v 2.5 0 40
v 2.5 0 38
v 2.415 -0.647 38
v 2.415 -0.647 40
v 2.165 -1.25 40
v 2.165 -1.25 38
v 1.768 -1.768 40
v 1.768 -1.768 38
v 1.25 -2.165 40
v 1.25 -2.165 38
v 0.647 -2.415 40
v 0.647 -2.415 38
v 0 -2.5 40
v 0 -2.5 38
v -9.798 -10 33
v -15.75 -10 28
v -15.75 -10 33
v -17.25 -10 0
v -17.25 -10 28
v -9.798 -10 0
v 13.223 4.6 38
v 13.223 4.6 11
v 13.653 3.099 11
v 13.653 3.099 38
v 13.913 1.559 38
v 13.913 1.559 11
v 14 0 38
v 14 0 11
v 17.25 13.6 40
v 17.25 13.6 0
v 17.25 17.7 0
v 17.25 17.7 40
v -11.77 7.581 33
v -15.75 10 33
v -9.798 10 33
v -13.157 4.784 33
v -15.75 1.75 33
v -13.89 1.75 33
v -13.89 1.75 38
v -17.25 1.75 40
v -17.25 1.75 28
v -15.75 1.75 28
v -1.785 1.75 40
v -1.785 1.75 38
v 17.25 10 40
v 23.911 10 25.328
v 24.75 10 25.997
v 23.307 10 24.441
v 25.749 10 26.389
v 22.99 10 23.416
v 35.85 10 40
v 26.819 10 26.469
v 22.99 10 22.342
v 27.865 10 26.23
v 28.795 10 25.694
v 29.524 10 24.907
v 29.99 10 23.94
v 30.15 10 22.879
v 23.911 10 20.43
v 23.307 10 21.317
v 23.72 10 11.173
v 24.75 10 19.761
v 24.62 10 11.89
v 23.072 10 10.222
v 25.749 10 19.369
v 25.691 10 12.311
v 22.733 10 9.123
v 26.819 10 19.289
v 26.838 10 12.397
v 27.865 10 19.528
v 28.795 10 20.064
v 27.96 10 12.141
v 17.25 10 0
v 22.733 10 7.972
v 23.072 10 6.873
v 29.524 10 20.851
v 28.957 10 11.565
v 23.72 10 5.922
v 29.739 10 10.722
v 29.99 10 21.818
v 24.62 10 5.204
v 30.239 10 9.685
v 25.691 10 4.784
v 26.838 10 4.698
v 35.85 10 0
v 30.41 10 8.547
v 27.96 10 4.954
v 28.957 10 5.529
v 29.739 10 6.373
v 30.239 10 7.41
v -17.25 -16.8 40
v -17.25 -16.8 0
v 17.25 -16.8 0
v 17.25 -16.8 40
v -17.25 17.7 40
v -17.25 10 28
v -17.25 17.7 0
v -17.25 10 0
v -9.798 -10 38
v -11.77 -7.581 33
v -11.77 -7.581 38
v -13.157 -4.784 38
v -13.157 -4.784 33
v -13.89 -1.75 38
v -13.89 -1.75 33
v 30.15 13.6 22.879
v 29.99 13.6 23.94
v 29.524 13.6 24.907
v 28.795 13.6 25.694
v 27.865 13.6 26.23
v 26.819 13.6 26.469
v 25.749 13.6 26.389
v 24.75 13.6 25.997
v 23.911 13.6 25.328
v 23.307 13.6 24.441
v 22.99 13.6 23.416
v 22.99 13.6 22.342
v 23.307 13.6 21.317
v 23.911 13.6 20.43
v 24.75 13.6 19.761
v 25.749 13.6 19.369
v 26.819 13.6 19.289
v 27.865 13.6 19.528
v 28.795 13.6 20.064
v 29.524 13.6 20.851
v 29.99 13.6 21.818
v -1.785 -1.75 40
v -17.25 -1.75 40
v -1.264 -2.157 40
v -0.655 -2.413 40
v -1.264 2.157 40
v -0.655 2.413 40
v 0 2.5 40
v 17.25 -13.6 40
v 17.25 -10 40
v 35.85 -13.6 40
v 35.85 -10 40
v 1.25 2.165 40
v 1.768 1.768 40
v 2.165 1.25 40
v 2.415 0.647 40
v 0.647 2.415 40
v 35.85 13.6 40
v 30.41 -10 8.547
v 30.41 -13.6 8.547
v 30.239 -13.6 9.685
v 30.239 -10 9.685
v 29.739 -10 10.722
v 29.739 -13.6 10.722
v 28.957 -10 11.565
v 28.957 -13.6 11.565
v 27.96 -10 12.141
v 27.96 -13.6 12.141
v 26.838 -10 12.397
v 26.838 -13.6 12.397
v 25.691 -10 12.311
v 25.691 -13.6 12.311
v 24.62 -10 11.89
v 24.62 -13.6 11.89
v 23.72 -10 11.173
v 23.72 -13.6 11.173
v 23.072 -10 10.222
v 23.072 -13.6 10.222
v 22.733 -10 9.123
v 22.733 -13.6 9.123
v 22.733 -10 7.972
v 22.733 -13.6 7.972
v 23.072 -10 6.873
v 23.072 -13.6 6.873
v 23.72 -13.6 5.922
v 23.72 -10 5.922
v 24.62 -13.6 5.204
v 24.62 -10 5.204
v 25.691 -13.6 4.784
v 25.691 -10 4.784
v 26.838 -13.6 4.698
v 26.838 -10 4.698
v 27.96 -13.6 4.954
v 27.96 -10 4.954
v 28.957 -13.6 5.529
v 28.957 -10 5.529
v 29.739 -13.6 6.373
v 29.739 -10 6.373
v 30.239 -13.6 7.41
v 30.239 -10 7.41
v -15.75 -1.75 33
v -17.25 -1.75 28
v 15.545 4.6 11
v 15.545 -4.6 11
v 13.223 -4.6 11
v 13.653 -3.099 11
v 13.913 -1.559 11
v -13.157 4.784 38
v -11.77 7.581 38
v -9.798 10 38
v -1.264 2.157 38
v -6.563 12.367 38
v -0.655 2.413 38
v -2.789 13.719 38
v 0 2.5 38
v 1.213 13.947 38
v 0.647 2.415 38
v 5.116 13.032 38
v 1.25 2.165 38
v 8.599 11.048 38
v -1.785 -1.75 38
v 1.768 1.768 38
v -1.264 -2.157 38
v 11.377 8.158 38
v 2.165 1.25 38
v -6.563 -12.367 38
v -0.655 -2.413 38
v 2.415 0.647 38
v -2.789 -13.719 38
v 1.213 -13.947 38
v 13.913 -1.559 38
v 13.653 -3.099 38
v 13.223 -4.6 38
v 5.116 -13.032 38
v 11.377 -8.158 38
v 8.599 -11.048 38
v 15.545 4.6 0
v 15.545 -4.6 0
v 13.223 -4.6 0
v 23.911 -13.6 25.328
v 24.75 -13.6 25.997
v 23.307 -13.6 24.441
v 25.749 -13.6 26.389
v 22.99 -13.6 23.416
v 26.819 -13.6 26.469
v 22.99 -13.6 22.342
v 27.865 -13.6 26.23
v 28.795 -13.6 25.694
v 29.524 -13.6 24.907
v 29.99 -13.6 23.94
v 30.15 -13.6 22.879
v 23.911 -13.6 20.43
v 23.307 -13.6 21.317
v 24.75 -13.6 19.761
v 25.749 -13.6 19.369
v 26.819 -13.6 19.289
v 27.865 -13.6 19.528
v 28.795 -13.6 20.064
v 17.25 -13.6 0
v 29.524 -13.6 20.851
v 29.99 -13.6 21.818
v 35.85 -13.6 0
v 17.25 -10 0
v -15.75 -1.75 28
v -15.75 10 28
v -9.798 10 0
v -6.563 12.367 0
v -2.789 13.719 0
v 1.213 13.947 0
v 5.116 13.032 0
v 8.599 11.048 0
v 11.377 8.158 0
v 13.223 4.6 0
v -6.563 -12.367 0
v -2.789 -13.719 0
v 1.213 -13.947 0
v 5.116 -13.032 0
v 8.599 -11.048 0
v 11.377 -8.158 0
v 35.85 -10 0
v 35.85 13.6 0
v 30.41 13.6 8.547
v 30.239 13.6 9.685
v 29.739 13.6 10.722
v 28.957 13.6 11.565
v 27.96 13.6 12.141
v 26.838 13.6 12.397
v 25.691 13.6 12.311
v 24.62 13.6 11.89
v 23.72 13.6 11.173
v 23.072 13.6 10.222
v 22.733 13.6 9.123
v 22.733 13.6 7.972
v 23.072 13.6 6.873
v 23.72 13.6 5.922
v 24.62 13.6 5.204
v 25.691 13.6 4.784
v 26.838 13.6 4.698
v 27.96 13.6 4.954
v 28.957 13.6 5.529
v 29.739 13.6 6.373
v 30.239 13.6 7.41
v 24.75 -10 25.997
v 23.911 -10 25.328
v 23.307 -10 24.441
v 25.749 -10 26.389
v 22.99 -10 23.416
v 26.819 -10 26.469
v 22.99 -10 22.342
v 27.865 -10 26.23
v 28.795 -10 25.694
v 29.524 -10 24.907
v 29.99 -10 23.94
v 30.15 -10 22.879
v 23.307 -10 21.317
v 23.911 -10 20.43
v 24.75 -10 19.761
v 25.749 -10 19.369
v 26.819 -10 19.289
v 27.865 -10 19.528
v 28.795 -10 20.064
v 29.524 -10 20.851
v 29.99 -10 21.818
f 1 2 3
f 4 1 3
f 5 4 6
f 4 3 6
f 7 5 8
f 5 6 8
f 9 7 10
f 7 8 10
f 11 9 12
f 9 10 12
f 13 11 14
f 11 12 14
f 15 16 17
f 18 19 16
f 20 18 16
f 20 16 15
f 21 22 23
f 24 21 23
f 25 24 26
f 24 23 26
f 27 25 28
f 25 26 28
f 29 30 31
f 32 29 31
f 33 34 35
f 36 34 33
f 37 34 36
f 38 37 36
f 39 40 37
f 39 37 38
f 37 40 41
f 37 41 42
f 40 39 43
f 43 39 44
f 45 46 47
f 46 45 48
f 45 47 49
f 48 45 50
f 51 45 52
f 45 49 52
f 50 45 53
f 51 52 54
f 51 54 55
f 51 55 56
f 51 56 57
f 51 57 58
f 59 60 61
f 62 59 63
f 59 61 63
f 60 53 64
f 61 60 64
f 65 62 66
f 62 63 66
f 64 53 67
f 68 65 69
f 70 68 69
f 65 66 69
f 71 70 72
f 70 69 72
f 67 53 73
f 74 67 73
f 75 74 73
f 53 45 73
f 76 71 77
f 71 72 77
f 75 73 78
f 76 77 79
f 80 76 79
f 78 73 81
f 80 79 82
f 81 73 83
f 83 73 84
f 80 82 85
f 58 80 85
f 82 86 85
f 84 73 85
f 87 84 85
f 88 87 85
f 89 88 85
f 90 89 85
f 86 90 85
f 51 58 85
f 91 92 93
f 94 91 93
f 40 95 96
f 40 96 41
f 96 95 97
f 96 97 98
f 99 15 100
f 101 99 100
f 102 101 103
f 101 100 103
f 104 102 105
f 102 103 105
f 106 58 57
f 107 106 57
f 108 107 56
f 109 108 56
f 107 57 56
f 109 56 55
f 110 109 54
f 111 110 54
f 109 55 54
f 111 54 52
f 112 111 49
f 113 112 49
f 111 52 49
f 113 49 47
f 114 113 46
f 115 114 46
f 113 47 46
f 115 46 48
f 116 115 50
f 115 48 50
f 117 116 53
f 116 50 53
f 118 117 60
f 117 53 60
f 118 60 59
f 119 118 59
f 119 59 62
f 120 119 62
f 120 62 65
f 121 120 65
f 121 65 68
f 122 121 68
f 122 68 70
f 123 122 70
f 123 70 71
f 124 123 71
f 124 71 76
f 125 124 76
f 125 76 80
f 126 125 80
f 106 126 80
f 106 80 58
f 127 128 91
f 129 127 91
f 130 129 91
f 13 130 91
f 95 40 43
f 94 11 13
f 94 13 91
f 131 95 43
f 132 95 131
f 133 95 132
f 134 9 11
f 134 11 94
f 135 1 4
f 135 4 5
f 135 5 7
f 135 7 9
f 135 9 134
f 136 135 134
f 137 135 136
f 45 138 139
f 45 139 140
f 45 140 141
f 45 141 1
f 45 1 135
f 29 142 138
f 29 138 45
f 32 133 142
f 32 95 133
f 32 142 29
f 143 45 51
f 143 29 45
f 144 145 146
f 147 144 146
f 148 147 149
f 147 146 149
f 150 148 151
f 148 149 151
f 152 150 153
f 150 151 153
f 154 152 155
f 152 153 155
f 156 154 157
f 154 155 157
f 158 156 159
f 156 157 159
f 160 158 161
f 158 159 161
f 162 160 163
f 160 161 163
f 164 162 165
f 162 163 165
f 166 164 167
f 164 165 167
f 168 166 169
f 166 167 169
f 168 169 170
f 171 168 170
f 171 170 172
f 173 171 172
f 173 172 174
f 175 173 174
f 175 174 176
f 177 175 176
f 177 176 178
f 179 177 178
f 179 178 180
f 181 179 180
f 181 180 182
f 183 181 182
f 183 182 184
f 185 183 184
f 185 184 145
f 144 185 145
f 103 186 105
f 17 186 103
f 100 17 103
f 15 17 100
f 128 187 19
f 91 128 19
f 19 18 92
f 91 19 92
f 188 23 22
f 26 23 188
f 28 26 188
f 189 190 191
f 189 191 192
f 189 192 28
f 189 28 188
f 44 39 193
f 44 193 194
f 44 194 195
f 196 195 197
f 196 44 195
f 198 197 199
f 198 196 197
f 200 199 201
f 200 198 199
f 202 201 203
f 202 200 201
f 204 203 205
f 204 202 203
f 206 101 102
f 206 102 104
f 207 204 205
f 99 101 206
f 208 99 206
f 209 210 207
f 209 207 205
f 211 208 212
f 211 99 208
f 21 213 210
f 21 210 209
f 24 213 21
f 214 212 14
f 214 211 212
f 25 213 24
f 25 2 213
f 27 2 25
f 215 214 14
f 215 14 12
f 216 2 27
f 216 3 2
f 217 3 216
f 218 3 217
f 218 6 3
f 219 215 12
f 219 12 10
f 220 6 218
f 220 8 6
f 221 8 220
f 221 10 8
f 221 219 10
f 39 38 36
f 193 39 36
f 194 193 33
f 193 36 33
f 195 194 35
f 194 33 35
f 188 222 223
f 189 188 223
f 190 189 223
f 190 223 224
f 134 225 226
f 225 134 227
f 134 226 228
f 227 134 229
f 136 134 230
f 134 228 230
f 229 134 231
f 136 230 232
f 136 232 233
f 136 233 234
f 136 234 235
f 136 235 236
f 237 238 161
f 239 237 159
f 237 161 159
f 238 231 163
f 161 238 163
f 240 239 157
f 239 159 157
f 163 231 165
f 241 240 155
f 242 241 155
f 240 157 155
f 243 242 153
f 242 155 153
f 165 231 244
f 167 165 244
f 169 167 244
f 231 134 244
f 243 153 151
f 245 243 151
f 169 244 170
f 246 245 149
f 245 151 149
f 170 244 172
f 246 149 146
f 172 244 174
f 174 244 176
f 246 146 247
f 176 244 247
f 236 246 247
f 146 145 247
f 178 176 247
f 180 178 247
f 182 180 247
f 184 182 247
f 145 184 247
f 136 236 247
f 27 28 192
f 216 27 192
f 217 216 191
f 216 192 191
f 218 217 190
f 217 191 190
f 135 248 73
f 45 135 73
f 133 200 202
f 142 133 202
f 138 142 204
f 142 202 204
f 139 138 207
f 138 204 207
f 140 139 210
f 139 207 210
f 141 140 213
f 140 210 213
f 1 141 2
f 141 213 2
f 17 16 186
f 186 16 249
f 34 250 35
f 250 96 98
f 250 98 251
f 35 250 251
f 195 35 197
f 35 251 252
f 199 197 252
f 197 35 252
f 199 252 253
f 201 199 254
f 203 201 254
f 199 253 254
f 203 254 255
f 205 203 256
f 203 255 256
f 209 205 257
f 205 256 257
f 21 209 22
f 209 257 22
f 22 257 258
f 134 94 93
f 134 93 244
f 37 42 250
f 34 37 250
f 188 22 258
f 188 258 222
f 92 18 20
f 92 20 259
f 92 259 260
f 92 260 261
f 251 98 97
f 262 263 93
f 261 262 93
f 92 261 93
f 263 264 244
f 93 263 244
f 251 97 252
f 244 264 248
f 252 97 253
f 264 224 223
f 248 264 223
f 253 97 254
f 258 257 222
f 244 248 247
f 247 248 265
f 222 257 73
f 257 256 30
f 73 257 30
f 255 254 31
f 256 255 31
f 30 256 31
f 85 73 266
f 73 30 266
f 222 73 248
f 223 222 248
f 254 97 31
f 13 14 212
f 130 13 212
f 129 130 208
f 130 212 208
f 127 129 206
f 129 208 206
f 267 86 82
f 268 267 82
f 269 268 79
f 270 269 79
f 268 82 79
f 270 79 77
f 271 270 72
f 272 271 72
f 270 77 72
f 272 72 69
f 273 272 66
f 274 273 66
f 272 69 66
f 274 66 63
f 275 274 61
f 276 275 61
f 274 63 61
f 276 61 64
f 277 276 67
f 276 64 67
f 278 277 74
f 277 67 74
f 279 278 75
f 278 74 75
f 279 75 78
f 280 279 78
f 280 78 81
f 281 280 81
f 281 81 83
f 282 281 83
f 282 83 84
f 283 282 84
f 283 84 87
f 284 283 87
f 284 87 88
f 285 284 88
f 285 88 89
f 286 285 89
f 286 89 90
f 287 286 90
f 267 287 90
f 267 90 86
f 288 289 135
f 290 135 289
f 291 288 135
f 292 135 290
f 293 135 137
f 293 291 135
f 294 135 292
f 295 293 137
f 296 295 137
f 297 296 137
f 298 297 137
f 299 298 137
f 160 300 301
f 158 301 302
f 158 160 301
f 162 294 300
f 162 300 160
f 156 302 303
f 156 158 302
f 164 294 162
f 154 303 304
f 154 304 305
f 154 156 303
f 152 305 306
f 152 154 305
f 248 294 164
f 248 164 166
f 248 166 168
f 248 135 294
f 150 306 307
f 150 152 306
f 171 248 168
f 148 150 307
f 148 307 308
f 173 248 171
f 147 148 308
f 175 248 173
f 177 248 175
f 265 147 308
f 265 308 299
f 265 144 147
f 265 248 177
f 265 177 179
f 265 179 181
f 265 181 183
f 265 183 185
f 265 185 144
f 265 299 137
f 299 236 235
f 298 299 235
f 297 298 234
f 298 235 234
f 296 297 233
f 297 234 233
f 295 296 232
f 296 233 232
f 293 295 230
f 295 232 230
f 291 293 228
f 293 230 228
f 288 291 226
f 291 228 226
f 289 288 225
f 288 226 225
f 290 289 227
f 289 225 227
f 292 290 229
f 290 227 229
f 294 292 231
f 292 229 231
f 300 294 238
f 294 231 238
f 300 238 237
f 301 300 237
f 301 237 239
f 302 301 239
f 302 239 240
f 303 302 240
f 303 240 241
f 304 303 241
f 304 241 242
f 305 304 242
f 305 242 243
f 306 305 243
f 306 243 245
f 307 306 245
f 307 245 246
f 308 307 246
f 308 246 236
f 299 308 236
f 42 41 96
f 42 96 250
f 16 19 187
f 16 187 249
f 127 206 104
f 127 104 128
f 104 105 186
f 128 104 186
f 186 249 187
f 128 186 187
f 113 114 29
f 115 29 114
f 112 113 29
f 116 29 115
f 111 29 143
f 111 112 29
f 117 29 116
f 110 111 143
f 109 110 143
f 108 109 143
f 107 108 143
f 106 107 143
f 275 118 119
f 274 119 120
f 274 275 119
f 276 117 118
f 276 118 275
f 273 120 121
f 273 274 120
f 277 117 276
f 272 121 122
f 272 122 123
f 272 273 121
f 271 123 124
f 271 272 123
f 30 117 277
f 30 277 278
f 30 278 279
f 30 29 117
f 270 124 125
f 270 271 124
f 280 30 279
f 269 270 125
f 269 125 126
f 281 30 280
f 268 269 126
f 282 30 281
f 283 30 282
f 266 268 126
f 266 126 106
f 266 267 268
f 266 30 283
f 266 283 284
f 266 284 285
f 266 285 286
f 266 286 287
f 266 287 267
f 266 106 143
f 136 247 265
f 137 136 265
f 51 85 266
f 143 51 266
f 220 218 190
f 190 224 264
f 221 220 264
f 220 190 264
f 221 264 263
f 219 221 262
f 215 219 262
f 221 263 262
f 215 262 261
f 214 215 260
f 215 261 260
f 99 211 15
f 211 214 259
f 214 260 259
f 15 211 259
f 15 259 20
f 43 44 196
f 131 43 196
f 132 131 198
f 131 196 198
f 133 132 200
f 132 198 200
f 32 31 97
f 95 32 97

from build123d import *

# Parameters (mm, degrees)
F0_W      = 18.6
F0_H      = 3.6
F1_DEPTH  = 40
F2_W      = 1.5
F2_H      = 3.5
F3_DEPTH  = 40
F4_DEPTH  = 38
F5_DEPTH  = 11
F6_DEPTH  = 33
F2_H_2    = 8.25
F7_DEPTH  = 28
F8_R      = 3.86
F9_DEPTH  = 40000
F8_R_2    = 3.6
F10_DEPTH = 30


with BuildPart() as f1:
    # F0 (on Top) → F1 (new body)
    with BuildSketch(Plane.XY):
        with Locations((26.55, 11.8)):
            Rectangle(F0_W, F0_H)
        Polygon((17.25, 17.7), (-17.25, 17.7), (-17.25, -16.8), (17.25, -16.8), (17.25, -13.6), (17.25, -10), (17.25, 10), (17.25, 13.6), align=None)
        with Locations((26.55, -11.8)):
            Rectangle(F0_W, F0_H)
    extrude(amount=F1_DEPTH)

    # F2 (on face) → F3 (cut, through all)
    with BuildSketch(Plane(origin=(0, 0, 0), x_dir=(1, 0, 0), z_dir=(0, 0, -1))):
        with BuildLine():
            ThreePointArc((2.5, 0), (1.767766953, 1.767766953), (0, 2.5))
            Line((0, 2.5), (0, 1.75))
            Line((0, 1.75), (0, -1.75))
            Line((0, -1.75), (0, -2.5))
            ThreePointArc((0, -2.5), (1.767766953, -1.767766953), (2.5, 0))
        make_face()
        with BuildLine():
            Line((0, 1.75), (0, 2.5))
            ThreePointArc((0, 2.5), (-0.9682458366, 2.3048861143), (-1.7853571071, 1.75))
            Line((-1.7853571071, 1.75), (0, 1.75))
        make_face()
        with BuildLine():
            ThreePointArc((-1.7853571071, -1.75), (-0.9682458366, -2.3048861143), (0, -2.5))
            Line((0, -2.5), (0, -1.75))
            Line((0, -1.75), (-1.7853571071, -1.75))
        make_face()
        with BuildLine():
            Line((0, 1.75), (-1.7853571071, 1.75))
            ThreePointArc((-1.7853571071, 1.75), (-2.5, 0), (-1.7853571071, -1.75))
            Line((-1.7853571071, -1.75), (0, -1.75))
            Line((0, -1.75), (0, 1.75))
        make_face()
        with BuildLine():
            Line((-1.7853571071, 1.75), (-13.8901943831, 1.75))
            ThreePointArc((-13.8901943831, 1.75), (-14, 0), (-13.8901943831, -1.75))
            Line((-13.8901943831, -1.75), (-1.7853571071, -1.75))
            ThreePointArc((-1.7853571071, -1.75), (-2.5, 0), (-1.7853571071, 1.75))
        make_face()
        with BuildLine():
            ThreePointArc((-13.8901943831, -1.75), (-14, 0), (-13.8901943831, 1.75))
            Line((-13.8901943831, 1.75), (-15.75, 1.75))
            Line((-15.75, 1.75), (-15.75, -1.75))
            Line((-15.75, -1.75), (-13.8901943831, -1.75))
        make_face()
        with Locations((-16.5, 0)):
            Rectangle(F2_W, F2_H)
    extrude(amount=-F3_DEPTH, mode=Mode.SUBTRACT)

    # F2 (on face) → F4 (cut)
    with BuildSketch(Plane(origin=(0, 0, 0), x_dir=(1, 0, 0), z_dir=(0, 0, -1))):
        with BuildLine():
            ThreePointArc((-9.7979589711, -10), (3.1972216116, -13.6300320603), (13.2227077409, -4.6))
            Line((13.2227077409, -4.6), (0, -4.6))
            Line((0, -4.6), (0, -10))
            Line((0, -10), (-9.7979589711, -10))
        make_face()
        with BuildLine():
            Line((-1.7853571071, 1.75), (-13.8901943831, 1.75))
            ThreePointArc((-13.8901943831, 1.75), (-14, 0), (-13.8901943831, -1.75))
            Line((-13.8901943831, -1.75), (-1.7853571071, -1.75))
            ThreePointArc((-1.7853571071, -1.75), (-2.5, 0), (-1.7853571071, 1.75))
        make_face()
        with BuildLine():
            ThreePointArc((-13.8901943831, -1.75), (-12.5418410663, -6.2211110476), (-9.7979589711, -10))
            Line((-9.7979589711, -10), (0, -10))
            Line((0, -10), (0, -4.6))
            Line((0, -4.6), (0, -2.5))
            ThreePointArc((0, -2.5), (-0.9682458366, -2.3048861143), (-1.7853571071, -1.75))
            Line((-1.7853571071, -1.75), (-13.8901943831, -1.75))
        make_face()
        with BuildLine():
            Line((0, 10), (-9.7979589711, 10))
            ThreePointArc((-9.7979589711, 10), (-12.5418410663, 6.2211110476), (-13.8901943831, 1.75))
            Line((-13.8901943831, 1.75), (-1.7853571071, 1.75))
            ThreePointArc((-1.7853571071, 1.75), (-0.9682458366, 2.3048861143), (0, 2.5))
            Line((0, 2.5), (0, 4.6))
            Line((0, 4.6), (0, 10))
        make_face()
        with BuildLine():
            Line((0, 4.6), (13.2227077409, 4.6))
            ThreePointArc((13.2227077409, 4.6), (3.1972216116, 13.6300320603), (-9.7979589711, 10))
            Line((-9.7979589711, 10), (0, 10))
            Line((0, 10), (0, 4.6))
        make_face()
        with BuildLine():
            ThreePointArc((13.2227077409, -4.6), (13.8043092615, -2.3326049417), (14, 0))
            ThreePointArc((14, 0), (13.8043092615, 2.3326049417), (13.2227077409, 4.6))
            Line((13.2227077409, 4.6), (0, 4.6))
            Line((0, 4.6), (0, 2.5))
            ThreePointArc((0, 2.5), (1.767766953, 1.767766953), (2.5, 0))
            ThreePointArc((2.5, 0), (1.767766953, -1.767766953), (0, -2.5))
            Line((0, -2.5), (0, -4.6))
            Line((0, -4.6), (13.2227077409, -4.6))
        make_face()
    extrude(amount=-F4_DEPTH, mode=Mode.SUBTRACT)

    # F2 (on face) → F5 (cut)
    with BuildSketch(Plane(origin=(0, 0, 0), x_dir=(1, 0, 0), z_dir=(0, 0, -1))):
        with BuildLine():
            ThreePointArc((13.2227077409, 4.6), (13.8043092615, 2.3326049417), (14, 0))
            ThreePointArc((14, 0), (13.8043092615, -2.3326049417), (13.2227077409, -4.6))
            Line((13.2227077409, -4.6), (15.5454194173, -4.6))
            Line((15.5454194173, -4.6), (15.5454194173, 4.6))
            Line((15.5454194173, 4.6), (13.2227077409, 4.6))
        make_face()
    extrude(amount=-F5_DEPTH, mode=Mode.SUBTRACT)

    # F2 (on face) → F6 (cut)
    with BuildSketch(Plane(origin=(0, 0, 0), x_dir=(1, 0, 0), z_dir=(0, 0, -1))):
        with BuildLine():
            ThreePointArc((-13.8901943831, 1.75), (-12.5418410663, 6.2211110476), (-9.7979589711, 10))
            Line((-9.7979589711, 10), (-15.75, 10))
            Line((-15.75, 10), (-15.75, 1.75))
            Line((-15.75, 1.75), (-13.8901943831, 1.75))
        make_face()
        with BuildLine():
            ThreePointArc((-13.8901943831, -1.75), (-14, 0), (-13.8901943831, 1.75))
            Line((-13.8901943831, 1.75), (-15.75, 1.75))
            Line((-15.75, 1.75), (-15.75, -1.75))
            Line((-15.75, -1.75), (-13.8901943831, -1.75))
        make_face()
        with BuildLine():
            Line((-15.75, -10), (-9.7979589711, -10))
            ThreePointArc((-9.7979589711, -10), (-12.5418410663, -6.2211110476), (-13.8901943831, -1.75))
            Line((-13.8901943831, -1.75), (-15.75, -1.75))
            Line((-15.75, -1.75), (-15.75, -10))
        make_face()
    extrude(amount=-F6_DEPTH, mode=Mode.SUBTRACT)

    # F2 (on face) → F7 (cut)
    with BuildSketch(Plane(origin=(0, 0, 0), x_dir=(1, 0, 0), z_dir=(0, 0, -1))):
        with Locations((-16.5, 5.875)):
            Rectangle(F2_W, F2_H_2)
        with Locations((-16.5, -5.875)):
            Rectangle(F2_W, F2_H_2)
    extrude(amount=-F7_DEPTH, mode=Mode.SUBTRACT)

    # F8 (on face) → F9 (cut)
    with BuildSketch(Plane.XZ.offset(13.6)):
        with Locations((26.55, 8.547344245)):
            Circle(F8_R)
    extrude(amount=-F9_DEPTH, mode=Mode.SUBTRACT)

    # F8 (on face) → F10 (cut)
    with BuildSketch(Plane.XZ.offset(13.6)):
        with Locations((26.55, 22.8790044785)):
            Circle(F8_R_2)
    extrude(amount=-F10_DEPTH, mode=Mode.SUBTRACT)


solid = f1.part
